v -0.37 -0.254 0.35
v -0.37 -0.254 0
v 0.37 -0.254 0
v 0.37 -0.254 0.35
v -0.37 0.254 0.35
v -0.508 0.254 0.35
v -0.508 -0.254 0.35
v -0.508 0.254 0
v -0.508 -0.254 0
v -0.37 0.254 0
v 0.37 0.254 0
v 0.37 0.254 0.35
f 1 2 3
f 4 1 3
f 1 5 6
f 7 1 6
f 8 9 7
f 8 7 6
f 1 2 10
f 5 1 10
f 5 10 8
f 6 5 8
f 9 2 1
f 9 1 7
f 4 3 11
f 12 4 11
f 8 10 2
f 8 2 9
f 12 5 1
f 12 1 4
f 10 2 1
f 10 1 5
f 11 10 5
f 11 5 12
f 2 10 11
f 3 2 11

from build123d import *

# Parameters (mm, degrees)
SKETCH_W     = 0.74
SKETCH_H     = 0.508
PAD_DEPTH    = 0.35
SKETCH001_W  = 0.138
SKETCH001_H  = 0.508
PAD001_DEPTH = 0.35


with BuildPart() as body:
    # Sketch → Pad (new body)
    with BuildSketch(Plane.XY):
        Rectangle(SKETCH_W, SKETCH_H)
    extrude(amount=PAD_DEPTH)


with BuildPart() as body001:
    # Sketch001 → Pad001 (new body)
    with BuildSketch(Plane.XY):
        with Locations((0.439, 0)):
            Rectangle(SKETCH001_W, SKETCH001_H)
    extrude(amount=PAD001_DEPTH)


with BuildPart() as part_mirroring:
    # Part__Mirroring: instance of Body001
    add(body001.part.mirror(Plane(origin=(0, 0, 0), x_dir=(0, -1, 0), z_dir=(1, 0, 0))))


solid = Compound([body.part, part_mirroring.part])
